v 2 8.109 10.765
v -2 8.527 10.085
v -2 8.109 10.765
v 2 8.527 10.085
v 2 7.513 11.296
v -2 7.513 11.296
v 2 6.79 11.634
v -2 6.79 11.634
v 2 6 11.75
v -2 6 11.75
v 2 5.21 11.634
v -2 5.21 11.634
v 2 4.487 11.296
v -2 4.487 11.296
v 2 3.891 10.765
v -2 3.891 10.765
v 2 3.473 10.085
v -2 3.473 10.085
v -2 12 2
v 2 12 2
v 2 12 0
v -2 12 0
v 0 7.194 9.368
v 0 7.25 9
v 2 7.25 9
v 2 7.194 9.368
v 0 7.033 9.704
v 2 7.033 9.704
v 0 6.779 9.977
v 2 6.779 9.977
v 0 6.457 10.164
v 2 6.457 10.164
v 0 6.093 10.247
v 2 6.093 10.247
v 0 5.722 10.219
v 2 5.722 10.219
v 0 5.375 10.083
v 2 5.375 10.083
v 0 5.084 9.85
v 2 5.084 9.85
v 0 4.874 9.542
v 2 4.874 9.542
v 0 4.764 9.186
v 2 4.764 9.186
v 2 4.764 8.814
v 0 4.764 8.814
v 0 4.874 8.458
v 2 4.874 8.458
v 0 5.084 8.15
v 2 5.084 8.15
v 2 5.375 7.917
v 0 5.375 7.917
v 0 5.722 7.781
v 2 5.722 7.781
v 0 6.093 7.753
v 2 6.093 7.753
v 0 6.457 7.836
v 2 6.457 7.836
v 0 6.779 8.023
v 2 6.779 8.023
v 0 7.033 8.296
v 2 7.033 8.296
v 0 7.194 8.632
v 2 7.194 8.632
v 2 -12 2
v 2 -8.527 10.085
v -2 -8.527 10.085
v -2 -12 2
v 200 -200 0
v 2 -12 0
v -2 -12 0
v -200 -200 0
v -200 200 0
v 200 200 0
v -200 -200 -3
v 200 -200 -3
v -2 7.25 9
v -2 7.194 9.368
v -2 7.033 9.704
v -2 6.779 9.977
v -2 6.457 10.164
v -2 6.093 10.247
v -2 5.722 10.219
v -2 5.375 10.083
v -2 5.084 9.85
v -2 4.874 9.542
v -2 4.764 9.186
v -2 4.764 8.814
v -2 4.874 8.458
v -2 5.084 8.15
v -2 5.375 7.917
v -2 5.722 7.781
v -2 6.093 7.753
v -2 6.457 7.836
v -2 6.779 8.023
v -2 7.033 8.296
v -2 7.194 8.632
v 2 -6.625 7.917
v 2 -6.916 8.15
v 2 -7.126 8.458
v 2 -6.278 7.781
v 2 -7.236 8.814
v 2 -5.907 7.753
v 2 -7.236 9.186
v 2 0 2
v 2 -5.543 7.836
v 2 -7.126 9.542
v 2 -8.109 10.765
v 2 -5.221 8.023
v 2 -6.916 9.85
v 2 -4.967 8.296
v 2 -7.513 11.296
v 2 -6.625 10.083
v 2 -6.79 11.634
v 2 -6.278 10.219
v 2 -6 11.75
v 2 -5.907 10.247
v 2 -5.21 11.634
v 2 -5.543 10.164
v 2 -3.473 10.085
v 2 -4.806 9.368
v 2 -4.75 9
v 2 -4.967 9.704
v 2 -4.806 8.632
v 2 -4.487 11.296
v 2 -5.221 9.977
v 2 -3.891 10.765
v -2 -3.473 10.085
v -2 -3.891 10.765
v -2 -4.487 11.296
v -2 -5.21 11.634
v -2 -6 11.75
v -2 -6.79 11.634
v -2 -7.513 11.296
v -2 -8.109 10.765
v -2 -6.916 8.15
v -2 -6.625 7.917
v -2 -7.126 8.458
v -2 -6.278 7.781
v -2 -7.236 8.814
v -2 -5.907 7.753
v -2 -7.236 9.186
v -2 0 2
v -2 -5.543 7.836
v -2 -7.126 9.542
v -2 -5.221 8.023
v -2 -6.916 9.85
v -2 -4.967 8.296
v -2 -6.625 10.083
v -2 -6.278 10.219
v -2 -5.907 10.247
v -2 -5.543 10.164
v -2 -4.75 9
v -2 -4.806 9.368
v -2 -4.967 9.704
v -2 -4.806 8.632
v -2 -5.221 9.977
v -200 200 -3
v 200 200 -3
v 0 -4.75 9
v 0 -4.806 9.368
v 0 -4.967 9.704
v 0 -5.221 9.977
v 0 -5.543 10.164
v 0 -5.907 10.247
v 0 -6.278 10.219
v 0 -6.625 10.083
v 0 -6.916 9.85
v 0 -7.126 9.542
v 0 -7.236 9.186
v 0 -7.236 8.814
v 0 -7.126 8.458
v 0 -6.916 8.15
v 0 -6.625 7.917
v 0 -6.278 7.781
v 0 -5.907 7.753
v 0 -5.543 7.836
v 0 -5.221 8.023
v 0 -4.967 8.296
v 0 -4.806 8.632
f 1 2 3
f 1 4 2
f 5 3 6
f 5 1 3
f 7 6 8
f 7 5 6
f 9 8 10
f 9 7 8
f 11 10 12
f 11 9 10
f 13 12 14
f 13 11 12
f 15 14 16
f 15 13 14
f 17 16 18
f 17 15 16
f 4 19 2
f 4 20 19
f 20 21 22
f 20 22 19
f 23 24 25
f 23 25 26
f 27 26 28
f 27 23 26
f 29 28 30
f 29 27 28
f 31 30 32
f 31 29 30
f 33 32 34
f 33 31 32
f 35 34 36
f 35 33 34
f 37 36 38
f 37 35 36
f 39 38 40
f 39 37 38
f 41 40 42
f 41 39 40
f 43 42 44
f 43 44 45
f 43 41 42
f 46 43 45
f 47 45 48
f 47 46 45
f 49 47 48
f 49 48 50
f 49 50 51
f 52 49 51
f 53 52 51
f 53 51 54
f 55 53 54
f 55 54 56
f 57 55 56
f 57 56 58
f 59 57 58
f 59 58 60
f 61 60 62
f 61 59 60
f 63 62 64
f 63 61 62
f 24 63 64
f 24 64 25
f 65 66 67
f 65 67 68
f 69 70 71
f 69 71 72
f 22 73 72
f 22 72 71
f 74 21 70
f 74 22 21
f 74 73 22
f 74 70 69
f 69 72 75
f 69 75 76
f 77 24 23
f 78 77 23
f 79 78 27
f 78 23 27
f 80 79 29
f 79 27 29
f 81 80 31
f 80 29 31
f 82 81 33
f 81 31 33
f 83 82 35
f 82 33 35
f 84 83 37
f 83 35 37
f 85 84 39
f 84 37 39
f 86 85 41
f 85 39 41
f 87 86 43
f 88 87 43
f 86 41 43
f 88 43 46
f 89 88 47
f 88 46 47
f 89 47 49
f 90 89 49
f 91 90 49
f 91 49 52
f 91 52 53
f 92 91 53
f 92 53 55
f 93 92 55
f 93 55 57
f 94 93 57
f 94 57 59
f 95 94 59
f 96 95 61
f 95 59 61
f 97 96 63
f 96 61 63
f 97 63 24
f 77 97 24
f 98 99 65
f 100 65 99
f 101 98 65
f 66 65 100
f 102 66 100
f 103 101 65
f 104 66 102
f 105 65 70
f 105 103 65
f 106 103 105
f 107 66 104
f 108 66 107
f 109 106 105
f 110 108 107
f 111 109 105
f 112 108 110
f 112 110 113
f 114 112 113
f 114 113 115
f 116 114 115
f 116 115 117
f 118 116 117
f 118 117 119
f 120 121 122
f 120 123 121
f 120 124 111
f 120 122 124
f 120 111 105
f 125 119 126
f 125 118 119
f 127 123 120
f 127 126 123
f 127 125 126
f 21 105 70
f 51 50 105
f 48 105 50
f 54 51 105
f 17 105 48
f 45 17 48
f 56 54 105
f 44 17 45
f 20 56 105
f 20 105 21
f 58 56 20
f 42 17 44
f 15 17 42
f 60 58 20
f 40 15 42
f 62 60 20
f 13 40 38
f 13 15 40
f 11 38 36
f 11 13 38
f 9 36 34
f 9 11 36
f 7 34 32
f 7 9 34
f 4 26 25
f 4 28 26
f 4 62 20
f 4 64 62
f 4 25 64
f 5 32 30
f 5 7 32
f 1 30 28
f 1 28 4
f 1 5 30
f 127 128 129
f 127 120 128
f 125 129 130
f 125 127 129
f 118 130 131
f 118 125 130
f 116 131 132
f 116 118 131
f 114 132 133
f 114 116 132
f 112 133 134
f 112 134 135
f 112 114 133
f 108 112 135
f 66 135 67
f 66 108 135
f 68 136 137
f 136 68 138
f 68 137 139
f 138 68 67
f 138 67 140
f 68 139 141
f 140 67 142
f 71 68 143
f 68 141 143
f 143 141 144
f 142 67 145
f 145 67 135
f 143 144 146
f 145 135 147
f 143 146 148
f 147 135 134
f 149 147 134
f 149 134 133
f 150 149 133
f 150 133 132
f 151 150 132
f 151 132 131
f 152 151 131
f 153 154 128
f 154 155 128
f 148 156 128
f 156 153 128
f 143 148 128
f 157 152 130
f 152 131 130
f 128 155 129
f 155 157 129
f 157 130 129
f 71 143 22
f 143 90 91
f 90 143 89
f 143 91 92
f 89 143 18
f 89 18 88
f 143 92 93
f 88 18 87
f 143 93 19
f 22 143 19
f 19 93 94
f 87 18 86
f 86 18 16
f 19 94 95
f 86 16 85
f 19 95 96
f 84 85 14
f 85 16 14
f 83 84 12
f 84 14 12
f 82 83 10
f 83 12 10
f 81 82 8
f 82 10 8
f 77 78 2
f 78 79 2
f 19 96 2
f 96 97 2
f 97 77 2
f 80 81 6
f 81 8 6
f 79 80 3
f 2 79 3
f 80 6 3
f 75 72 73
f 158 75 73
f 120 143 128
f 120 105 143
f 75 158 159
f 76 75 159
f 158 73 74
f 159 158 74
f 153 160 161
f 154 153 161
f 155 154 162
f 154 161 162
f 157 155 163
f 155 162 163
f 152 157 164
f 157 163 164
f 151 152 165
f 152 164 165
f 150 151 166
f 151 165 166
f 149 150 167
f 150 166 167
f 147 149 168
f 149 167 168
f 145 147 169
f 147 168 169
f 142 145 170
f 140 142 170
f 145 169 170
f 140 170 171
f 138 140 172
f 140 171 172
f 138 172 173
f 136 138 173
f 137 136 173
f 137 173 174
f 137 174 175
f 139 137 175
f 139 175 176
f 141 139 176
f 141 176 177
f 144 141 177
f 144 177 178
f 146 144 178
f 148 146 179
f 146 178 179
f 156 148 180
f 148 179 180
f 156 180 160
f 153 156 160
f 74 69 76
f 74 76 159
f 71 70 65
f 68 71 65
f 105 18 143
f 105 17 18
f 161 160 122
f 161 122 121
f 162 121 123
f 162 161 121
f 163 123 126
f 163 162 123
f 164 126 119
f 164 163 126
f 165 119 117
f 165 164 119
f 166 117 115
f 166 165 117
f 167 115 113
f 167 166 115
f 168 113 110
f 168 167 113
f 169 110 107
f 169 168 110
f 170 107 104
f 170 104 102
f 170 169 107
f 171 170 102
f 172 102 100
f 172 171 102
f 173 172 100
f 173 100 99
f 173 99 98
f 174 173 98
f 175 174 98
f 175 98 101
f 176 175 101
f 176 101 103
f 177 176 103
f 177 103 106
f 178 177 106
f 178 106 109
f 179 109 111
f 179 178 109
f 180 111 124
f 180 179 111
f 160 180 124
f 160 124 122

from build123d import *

# Parameters (mm, degrees)
F0_W     = 400
F0_H     = 400
F1_DEPTH = 3
F2_R     = 1.25
F2_W     = 12
F2_H     = 2
F3_DEPTH = 2
F4_DEPTH = 2


with BuildPart() as f1:
    # F0 (on Top) → F1 (new body)
    with BuildSketch(Plane.XY):
        Rectangle(F0_W, F0_H)
    extrude(amount=-F1_DEPTH)

    # F2 (on Right) → F3 (join)
    with BuildSketch(Plane.YZ):
        with BuildLine():
            ThreePointArc((-3.4732674635, 10.0854136027), (-6, 11.75), (-8.5267325365, 10.0854136027))
            ThreePointArc((-8.5267325365, 10.0854136027), (-6.5540692757, 6.3063951222), (-3.25, 9))
            ThreePointArc((-3.25, 9), (-3.3063951222, 9.5540692757), (-3.4732674635, 10.0854136027))
        make_face()
        with Locations((-6, 9)):
            Circle(F2_R, mode=Mode.SUBTRACT)
        with BuildLine():
            Line((-8.5267325365, 10.0854136027), (-12, 2))
            Line((-12, 2), (0, 2))
            Line((0, 2), (-3.4732674635, 10.0854136027))
            ThreePointArc((-3.4732674635, 10.0854136027), (-3.3063951222, 9.5540692757), (-3.25, 9))
            ThreePointArc((-3.25, 9), (-6.5540692757, 6.3063951222), (-8.5267325365, 10.0854136027))
        make_face()
        with Locations((-6, 1)):
            Rectangle(F2_W, F2_H)
        with Locations((6, 1)):
            Rectangle(F2_W, F2_H)
        with BuildLine():
            Line((3.4732674635, 10.0854136027), (0, 2))
            Line((0, 2), (12, 2))
            Line((12, 2), (8.5267325365, 10.0854136027))
            ThreePointArc((8.5267325365, 10.0854136027), (8.6936048778, 9.5540692757), (8.75, 9))
            ThreePointArc((8.75, 9), (5.4459307243, 6.3063951222), (3.4732674635, 10.0854136027))
        make_face()
        with BuildLine():
            ThreePointArc((8.5267325365, 10.0854136027), (6, 11.75), (3.4732674635, 10.0854136027))
            ThreePointArc((3.4732674635, 10.0854136027), (5.4459307243, 6.3063951222), (8.75, 9))
            ThreePointArc((8.75, 9), (8.6936048778, 9.5540692757), (8.5267325365, 10.0854136027))
        make_face()
        with Locations((6, 9)):
            Circle(F2_R, mode=Mode.SUBTRACT)
    extrude(amount=F3_DEPTH)

    # F4 (add): a face of the model
    f4_faces = [f1.faces().sort_by_distance(p)[0] for p in [
        (0, -6, 11.4827805209),
    ]]
    extrude(f4_faces, amount=F4_DEPTH)


solid = f1.part
